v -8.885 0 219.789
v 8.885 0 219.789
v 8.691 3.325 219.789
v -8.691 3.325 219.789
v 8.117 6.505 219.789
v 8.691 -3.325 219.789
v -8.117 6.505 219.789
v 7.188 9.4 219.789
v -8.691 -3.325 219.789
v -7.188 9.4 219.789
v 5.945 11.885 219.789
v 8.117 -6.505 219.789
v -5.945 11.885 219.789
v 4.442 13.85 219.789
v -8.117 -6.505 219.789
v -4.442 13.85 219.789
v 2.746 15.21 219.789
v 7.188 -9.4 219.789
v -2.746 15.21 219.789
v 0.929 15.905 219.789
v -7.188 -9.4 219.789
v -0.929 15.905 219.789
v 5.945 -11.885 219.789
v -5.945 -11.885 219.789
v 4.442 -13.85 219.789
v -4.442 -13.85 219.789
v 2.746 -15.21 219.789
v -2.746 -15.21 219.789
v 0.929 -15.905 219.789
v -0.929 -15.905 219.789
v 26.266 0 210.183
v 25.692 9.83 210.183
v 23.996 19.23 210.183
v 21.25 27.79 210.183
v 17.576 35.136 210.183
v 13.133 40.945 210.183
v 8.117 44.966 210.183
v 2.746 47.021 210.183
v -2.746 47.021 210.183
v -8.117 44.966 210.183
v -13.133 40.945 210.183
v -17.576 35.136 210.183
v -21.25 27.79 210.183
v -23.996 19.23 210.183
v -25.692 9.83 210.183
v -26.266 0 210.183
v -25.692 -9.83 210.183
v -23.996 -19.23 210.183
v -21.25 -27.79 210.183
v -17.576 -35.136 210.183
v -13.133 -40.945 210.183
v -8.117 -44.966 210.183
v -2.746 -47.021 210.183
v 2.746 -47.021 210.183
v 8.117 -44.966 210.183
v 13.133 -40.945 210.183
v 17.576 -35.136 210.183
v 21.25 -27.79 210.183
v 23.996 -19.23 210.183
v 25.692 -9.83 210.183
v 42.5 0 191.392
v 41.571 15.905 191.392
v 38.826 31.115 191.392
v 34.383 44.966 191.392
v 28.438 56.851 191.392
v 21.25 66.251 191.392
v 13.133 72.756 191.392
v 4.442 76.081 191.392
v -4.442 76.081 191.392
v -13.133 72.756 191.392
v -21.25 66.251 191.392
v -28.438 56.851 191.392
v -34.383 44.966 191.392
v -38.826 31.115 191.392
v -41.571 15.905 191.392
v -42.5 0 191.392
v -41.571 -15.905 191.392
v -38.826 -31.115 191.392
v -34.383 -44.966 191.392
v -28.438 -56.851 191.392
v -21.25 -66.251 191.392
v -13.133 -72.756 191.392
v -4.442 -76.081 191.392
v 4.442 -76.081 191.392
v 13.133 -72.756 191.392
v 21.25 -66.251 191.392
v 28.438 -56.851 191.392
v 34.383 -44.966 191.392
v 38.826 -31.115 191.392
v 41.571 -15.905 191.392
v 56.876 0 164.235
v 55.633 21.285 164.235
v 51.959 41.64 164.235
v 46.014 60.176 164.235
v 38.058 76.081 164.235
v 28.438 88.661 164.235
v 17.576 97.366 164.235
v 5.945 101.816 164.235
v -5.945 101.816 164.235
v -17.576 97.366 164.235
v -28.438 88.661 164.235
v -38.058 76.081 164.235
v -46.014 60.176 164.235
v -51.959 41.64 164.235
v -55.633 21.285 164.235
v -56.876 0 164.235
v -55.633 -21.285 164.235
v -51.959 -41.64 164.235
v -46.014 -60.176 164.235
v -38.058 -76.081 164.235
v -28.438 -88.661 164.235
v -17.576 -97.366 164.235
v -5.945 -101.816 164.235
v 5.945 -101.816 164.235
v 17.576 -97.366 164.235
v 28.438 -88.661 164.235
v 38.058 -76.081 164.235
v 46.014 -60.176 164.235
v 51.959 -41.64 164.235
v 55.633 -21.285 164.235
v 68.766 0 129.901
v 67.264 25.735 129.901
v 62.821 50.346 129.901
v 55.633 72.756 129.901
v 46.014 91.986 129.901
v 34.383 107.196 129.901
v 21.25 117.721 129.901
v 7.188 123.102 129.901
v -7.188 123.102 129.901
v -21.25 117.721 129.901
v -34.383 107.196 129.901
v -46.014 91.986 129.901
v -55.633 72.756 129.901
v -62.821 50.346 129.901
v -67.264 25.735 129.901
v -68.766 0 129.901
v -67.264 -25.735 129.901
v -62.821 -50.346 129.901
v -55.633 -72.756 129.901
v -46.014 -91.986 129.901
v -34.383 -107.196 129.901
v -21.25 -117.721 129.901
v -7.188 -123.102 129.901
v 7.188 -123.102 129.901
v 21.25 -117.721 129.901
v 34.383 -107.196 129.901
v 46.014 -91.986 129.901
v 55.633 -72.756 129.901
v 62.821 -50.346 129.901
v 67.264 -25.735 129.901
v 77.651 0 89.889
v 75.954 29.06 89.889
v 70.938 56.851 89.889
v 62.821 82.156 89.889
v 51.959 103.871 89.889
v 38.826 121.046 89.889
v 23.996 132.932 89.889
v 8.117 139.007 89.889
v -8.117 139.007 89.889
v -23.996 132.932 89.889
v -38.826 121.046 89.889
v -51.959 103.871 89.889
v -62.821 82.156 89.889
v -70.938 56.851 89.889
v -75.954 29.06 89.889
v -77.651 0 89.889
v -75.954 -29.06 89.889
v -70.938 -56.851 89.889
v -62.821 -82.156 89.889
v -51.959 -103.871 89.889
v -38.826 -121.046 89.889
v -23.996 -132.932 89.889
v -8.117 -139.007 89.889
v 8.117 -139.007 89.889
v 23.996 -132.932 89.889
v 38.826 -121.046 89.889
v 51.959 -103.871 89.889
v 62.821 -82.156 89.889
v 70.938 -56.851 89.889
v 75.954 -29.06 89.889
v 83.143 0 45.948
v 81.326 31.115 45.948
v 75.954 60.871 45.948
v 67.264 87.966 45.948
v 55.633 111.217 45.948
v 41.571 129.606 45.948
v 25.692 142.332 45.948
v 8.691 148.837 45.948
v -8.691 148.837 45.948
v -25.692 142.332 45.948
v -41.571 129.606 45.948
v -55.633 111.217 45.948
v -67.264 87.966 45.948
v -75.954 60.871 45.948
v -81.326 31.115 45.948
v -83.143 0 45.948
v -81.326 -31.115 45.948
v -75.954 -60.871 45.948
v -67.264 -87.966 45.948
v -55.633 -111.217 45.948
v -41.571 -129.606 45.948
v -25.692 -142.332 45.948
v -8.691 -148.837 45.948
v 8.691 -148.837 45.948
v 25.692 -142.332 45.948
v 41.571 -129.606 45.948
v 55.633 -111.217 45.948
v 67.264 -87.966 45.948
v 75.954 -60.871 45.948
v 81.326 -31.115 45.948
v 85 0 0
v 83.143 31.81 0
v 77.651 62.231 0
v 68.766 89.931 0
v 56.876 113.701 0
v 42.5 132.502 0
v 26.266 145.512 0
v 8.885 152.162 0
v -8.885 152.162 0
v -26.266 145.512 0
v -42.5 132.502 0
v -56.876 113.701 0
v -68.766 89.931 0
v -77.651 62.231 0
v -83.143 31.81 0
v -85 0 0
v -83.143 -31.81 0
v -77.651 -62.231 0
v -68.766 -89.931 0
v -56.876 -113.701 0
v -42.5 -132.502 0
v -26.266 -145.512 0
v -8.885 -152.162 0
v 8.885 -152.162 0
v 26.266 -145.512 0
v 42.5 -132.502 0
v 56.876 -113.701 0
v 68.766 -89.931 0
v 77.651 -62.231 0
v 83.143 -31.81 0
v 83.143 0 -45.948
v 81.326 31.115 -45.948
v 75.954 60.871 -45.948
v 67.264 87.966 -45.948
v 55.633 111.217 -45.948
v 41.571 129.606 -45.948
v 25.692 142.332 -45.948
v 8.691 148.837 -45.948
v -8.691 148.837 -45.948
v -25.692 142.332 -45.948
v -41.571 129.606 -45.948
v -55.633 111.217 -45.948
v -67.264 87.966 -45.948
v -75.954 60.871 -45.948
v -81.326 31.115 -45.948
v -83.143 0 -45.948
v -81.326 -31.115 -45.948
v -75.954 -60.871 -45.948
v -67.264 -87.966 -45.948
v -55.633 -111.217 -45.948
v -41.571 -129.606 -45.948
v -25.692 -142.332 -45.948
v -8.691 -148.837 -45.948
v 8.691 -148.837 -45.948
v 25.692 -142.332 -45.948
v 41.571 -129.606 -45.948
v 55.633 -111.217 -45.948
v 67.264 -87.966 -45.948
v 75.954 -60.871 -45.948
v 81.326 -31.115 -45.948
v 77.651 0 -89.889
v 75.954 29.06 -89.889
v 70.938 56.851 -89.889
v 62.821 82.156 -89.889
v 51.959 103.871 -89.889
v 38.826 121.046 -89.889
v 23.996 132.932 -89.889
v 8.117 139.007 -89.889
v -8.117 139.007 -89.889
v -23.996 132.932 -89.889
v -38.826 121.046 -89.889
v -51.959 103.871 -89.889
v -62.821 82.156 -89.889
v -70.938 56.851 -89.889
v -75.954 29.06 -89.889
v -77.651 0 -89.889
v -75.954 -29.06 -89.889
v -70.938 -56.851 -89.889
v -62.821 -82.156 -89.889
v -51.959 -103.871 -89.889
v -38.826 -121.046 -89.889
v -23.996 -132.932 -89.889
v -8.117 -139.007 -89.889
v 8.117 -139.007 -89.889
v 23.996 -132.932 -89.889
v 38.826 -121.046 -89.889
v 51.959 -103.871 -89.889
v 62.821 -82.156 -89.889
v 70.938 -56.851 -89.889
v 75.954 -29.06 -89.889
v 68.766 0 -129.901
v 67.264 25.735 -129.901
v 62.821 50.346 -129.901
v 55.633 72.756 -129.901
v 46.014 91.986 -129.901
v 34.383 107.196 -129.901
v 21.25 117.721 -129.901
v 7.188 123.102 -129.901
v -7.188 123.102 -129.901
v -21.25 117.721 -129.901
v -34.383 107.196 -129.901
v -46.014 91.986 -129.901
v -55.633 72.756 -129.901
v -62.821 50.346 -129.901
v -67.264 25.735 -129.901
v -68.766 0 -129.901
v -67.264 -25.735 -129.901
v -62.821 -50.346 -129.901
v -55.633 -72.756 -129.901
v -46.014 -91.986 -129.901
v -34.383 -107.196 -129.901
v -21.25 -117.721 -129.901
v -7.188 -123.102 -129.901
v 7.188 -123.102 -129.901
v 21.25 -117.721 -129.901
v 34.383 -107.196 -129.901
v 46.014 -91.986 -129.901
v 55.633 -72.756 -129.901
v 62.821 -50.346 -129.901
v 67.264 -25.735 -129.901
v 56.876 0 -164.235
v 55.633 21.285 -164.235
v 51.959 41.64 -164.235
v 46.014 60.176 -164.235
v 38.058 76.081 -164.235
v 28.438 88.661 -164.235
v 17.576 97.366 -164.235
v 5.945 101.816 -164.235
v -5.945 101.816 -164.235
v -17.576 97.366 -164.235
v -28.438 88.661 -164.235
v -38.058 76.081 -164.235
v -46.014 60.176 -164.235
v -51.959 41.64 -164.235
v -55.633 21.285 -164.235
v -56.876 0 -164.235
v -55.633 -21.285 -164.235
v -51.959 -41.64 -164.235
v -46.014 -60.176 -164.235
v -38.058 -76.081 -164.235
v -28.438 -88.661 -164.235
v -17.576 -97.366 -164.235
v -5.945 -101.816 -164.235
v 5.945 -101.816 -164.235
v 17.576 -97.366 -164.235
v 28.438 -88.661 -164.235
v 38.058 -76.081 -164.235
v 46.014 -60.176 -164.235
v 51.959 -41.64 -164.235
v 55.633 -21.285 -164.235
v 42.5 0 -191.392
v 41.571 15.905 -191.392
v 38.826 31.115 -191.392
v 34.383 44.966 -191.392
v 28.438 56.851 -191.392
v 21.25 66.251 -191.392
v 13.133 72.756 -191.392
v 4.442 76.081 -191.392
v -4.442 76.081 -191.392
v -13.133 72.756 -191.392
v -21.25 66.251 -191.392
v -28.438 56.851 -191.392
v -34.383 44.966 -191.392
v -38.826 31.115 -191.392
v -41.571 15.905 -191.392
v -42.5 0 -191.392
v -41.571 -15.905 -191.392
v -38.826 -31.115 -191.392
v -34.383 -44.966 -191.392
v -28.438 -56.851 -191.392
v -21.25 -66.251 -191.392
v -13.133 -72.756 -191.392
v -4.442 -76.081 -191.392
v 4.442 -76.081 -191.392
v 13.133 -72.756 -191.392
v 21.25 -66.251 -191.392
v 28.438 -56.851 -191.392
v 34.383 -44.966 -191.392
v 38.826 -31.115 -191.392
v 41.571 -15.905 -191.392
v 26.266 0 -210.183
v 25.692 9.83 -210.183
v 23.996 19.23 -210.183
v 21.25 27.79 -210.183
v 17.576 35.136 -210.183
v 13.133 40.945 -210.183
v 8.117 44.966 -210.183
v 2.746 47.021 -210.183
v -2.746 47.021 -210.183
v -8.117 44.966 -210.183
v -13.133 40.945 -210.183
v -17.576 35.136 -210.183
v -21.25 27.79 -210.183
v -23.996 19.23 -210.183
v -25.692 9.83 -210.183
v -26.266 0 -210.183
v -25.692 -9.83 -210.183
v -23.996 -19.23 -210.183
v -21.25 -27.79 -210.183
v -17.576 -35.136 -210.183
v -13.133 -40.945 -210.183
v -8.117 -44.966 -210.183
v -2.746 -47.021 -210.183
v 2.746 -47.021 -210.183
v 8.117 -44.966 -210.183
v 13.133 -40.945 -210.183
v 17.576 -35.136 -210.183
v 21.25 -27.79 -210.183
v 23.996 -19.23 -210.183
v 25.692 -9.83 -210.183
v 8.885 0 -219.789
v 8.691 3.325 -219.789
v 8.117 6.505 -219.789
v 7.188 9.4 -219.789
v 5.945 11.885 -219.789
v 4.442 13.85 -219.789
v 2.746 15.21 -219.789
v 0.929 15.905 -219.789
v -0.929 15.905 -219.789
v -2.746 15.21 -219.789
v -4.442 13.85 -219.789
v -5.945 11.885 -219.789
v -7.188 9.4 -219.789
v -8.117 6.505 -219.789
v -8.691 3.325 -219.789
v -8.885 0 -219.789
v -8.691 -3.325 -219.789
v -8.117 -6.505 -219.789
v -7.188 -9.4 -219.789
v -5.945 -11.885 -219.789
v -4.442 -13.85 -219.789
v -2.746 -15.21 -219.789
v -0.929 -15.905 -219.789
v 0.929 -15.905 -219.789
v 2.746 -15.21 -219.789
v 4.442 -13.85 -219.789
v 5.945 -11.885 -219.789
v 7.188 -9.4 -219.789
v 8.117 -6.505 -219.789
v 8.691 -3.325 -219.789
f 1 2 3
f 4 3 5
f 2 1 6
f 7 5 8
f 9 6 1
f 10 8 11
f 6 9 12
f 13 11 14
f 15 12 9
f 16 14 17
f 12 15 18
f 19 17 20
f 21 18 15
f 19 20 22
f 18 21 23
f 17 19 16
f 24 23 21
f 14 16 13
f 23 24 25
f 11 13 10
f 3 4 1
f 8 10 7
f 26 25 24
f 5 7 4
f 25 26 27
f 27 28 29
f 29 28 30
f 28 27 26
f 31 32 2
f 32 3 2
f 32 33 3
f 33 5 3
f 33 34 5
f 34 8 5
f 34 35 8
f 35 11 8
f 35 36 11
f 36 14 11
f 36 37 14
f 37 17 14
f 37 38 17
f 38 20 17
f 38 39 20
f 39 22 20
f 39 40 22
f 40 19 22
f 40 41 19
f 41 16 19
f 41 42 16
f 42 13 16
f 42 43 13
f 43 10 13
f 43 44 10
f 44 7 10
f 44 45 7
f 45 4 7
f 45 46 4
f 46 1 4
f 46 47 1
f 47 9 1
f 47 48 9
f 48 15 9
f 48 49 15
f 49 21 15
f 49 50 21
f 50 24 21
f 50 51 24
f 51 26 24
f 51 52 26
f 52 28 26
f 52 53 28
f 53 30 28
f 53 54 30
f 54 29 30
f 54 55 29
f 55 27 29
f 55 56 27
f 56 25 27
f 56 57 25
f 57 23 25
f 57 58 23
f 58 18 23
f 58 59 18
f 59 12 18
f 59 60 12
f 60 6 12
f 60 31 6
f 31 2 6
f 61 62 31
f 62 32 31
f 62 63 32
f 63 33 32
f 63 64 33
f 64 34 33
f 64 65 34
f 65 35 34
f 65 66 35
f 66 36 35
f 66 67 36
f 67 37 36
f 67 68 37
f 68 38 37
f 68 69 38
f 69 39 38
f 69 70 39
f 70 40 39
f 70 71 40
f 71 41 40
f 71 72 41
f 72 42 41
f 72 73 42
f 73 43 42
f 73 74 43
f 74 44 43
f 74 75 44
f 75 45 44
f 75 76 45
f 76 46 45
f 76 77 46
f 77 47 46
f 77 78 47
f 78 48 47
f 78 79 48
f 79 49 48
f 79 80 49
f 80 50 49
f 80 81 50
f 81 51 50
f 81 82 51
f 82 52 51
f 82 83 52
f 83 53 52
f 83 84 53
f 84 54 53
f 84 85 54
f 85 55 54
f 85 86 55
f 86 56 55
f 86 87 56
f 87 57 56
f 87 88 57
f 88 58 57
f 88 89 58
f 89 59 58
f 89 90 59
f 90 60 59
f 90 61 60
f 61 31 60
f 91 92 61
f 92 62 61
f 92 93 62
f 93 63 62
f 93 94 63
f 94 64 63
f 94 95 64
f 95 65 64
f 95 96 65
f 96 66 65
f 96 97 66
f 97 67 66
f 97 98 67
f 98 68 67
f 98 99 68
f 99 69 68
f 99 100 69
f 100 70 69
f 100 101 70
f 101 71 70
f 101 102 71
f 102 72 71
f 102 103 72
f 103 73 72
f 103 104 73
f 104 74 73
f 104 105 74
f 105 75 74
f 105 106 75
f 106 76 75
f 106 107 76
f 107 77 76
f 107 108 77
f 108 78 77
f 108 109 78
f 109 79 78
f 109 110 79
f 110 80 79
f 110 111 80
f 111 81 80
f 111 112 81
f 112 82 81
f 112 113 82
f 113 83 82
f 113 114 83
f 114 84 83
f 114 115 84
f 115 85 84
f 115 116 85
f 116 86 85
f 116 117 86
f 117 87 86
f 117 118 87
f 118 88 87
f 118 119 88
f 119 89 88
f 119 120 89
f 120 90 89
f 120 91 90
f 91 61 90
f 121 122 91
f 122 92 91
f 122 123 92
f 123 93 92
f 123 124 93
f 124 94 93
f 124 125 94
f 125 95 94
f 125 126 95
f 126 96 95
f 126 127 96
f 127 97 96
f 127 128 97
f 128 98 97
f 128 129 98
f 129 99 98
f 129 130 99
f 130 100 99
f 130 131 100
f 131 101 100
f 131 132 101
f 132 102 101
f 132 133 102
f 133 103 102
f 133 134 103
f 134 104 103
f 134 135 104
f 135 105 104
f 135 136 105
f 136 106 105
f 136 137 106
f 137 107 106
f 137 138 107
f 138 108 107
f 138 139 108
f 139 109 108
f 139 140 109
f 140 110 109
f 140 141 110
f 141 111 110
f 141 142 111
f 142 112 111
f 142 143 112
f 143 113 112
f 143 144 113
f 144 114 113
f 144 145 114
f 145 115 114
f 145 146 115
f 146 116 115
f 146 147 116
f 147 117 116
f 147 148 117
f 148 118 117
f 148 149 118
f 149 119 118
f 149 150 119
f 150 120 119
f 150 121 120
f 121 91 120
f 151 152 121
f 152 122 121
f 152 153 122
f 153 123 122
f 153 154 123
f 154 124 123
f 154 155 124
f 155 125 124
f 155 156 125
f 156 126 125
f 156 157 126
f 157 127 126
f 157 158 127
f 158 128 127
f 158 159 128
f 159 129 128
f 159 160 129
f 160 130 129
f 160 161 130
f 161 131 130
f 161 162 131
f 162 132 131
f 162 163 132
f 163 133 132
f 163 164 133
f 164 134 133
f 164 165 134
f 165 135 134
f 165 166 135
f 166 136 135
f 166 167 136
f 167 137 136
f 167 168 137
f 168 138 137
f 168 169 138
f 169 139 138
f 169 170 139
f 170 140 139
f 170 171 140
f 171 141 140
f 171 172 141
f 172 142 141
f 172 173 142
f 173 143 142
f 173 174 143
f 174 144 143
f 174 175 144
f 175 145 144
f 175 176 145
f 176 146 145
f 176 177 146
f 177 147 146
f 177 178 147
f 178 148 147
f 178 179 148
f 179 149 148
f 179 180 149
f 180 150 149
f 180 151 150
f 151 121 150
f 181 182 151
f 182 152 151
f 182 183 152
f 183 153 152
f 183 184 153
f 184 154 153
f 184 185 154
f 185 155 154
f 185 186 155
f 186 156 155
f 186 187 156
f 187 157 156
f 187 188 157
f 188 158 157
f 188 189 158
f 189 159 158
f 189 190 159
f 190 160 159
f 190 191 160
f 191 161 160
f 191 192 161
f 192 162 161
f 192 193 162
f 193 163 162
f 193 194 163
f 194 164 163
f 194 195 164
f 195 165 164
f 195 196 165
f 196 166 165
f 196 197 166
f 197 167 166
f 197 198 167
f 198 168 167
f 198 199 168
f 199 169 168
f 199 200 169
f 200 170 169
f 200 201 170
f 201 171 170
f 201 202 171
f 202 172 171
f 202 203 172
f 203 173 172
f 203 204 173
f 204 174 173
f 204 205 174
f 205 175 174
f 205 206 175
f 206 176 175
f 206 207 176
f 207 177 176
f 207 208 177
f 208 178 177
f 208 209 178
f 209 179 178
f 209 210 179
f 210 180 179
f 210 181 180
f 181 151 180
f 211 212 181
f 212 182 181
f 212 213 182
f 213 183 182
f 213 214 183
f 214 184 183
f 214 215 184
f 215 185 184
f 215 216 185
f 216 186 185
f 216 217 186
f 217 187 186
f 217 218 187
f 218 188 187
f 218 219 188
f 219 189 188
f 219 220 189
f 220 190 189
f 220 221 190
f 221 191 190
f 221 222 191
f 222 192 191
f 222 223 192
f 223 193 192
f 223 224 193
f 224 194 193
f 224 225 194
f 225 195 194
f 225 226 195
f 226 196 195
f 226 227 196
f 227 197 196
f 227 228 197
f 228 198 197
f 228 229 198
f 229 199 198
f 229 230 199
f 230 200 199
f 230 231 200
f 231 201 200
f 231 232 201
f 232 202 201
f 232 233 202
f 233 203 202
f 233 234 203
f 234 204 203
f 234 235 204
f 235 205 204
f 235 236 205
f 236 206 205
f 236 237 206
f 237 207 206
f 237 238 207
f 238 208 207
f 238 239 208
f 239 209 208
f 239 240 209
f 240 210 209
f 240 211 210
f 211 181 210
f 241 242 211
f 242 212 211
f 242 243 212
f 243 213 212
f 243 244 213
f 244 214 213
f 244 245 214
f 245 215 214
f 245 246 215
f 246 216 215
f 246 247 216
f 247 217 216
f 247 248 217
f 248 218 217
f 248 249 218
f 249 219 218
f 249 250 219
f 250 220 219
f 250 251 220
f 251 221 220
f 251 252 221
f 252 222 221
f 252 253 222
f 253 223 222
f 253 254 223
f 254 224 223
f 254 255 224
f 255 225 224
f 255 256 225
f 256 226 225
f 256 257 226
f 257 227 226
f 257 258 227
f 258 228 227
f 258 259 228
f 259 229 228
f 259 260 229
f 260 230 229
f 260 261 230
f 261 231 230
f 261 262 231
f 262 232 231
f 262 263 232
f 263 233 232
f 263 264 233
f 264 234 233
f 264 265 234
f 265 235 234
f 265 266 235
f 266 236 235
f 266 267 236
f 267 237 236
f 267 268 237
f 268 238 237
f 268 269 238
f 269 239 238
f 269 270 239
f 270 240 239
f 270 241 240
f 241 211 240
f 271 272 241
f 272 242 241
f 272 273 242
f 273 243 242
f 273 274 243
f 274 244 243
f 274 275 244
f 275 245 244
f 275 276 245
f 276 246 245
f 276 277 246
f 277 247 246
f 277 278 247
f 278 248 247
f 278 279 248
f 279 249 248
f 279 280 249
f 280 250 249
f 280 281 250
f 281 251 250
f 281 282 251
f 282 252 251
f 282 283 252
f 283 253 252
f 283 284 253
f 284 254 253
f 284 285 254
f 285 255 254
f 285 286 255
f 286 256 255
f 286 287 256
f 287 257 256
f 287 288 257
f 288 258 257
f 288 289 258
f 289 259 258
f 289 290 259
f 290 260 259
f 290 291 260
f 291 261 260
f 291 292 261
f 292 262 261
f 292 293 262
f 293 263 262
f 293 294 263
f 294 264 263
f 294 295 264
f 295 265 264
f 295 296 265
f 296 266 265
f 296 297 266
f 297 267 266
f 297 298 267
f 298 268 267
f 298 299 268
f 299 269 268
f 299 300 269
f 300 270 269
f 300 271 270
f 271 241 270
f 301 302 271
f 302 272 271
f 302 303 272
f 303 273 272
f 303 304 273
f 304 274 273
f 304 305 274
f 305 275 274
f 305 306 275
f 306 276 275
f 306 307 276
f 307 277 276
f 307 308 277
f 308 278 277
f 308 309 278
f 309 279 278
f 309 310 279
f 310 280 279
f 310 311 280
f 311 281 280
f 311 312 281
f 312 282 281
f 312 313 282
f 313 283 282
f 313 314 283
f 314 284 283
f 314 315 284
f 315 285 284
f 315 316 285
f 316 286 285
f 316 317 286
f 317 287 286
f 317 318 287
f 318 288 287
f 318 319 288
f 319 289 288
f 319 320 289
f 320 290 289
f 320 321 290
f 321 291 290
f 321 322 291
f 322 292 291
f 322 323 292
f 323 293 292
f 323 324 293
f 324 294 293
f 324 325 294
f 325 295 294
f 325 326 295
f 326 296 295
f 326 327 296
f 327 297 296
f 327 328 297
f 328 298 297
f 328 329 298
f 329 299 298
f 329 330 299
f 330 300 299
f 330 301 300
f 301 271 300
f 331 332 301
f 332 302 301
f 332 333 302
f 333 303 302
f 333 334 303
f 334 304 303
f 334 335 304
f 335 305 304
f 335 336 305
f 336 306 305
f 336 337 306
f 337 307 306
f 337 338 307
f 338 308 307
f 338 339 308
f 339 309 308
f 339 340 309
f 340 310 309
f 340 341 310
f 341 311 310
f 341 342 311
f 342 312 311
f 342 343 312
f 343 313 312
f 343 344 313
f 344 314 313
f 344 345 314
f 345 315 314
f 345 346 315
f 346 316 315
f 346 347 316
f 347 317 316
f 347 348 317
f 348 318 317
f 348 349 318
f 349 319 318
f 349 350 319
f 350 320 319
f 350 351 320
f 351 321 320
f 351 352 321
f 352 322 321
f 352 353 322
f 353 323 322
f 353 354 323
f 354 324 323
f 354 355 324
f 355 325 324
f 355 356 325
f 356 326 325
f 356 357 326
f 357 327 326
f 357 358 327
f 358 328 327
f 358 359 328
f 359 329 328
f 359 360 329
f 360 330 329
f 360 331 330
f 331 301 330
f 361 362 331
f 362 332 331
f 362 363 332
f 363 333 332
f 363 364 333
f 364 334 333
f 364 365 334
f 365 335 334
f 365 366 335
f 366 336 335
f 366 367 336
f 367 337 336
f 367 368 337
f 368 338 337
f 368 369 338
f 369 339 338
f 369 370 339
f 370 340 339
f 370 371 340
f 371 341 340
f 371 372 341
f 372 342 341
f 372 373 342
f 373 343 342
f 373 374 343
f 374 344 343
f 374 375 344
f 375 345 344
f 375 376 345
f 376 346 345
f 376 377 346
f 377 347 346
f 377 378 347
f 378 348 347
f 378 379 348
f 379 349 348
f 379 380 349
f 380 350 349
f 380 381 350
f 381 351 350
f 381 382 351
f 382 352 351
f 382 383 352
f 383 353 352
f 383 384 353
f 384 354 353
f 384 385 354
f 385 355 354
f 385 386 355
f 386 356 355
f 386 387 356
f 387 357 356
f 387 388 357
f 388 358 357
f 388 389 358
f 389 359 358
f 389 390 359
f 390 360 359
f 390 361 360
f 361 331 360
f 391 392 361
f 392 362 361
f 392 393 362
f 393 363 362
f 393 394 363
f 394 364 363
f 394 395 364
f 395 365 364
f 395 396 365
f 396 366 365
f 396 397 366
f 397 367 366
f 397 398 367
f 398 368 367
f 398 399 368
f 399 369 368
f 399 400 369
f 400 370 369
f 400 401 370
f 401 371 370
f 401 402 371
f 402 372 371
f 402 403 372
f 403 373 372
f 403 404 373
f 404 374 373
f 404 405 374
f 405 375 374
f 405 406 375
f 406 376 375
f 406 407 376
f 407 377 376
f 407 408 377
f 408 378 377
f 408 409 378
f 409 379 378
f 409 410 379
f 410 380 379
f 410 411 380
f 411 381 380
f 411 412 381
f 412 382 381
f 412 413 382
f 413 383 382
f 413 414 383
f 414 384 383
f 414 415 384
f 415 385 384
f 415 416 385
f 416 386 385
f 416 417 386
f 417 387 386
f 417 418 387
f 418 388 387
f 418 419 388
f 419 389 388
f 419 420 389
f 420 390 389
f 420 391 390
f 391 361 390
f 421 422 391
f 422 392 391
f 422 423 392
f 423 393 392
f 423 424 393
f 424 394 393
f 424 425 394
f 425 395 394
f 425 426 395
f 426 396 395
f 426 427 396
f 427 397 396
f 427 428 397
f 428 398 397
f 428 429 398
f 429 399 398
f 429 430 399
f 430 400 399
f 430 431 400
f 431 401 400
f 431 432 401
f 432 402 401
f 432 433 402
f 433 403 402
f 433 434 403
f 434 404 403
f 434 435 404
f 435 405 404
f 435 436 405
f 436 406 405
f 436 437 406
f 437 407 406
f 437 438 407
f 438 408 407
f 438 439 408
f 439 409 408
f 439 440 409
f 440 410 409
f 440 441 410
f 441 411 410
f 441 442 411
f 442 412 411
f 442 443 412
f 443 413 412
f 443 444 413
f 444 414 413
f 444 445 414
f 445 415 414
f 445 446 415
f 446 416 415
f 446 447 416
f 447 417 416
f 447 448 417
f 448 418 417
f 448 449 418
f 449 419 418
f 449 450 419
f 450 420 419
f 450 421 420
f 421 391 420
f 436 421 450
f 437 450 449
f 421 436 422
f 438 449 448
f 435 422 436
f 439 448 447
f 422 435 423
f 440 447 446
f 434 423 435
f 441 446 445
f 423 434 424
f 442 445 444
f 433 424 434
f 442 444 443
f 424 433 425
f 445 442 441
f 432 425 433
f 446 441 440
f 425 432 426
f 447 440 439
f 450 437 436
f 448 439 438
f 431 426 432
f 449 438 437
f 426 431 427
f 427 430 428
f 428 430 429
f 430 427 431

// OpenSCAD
// Generated by SolidPython 1.0.1 on 2020-07-29 00:39:26


scale(v = [5, 9, 13]) {
	sphere(r = 17);
}
/***********************************************
*********      SolidPython code:      **********
************************************************
 
# import packages: SolidPython
from solid import *
from solid.utils import *
from itertools import chain, combinations


class Resize:

    def __init__(self, scad_file):
        self.scad_file = scad_file
        #self.scad_file = import_scad(scad_file)
        # cone/cylinder param:
        self.r1 = 0
        self.r2 = 0
        self.h = 0
        # rectangular prism param:
        self.w = 0
        self.l = 0
        # ellipse param:
        self.r = 0

    # import OpenScad code (file name corresponds to shape)


    # classify shape + parameters
    def assign(self, param1, param2, param3):
        if self.scad_file == 'cone.scad':
            self.r1 = param1
            self.r2 = param2
            self.h = param3
        elif self.scad_file == 'cylinder.scad':
            self.r1 = param1
            self.r2 = param2
            self.h = param3
        elif self.scad_file == 'rectangularPrism.scad':
            self.h = param1
            self.l = param2
            self.w = param3
        else:
            self.r = param1
            self.h = param2

    # resize parameters
    def iterate(self):
        x = range(3, 20, 2)
        i = 1
        if self.scad_file == 'cone.scad':
            tempList = list(combinations(x, 2))
            for temp in tempList:
                param1 = temp[0]
                param2 = temp[1]
                filepath = 'produced_scad_files/' + 'cone' + str(param1) + '_' + str(param2) + '_' + '.scad'
                scad_render_to_file(cylinder(h=param1, r1=param2, r2=0), filepath)

        elif self.scad_file == 'cylinder.scad':
            tempList = list(combinations(x, 3))
            for temp in tempList:
                param1 = temp[0]
                param2 = temp[1]
                filepath = 'produced_scad_files/' + 'cylinder' + str(param1) + '_' + str(param2) + '_' + '.scad'
                scad_render_to_file(cylinder(h=param1, r1=param2, r2=param2), filepath)

        elif self.scad_file == 'rectangularPrism.scad':
            tempList = list(combinations(x, 3))
            for temp in tempList:
                param1 = temp[0]
                param2 = temp[1]
                param3 = temp[2]
                filepath = 'produced_scad_files/' + 'rectangularPrism' + str(param1) + '_' + str(param2) + '_' + str(
                    param3) + '.scad'
                scad_render_to_file(cube(size=(param1, param2, param3)), filepath)

        elif self.scad_file == 'ellipse.scad':
            tempList = list(combinations(x, 4))
            for temp in tempList:
                param1 = temp[0]
                param2 = temp[1]
                param3 = temp[2]
                param4 = temp[3]
                filepath = 'produced_scad_files/' + 'ellipse' + str(param1) + '_' + str(param2) + '_' + str(param3) + '_' + str(param4) + '.scad'
                scad_render_to_file(scale([param1, param2, param3])(sphere(r=param4)), filepath)

    def render_to_scadfile(self):
        scad_render_to_file(scad, 'example.scad') 
 
************************************************/
